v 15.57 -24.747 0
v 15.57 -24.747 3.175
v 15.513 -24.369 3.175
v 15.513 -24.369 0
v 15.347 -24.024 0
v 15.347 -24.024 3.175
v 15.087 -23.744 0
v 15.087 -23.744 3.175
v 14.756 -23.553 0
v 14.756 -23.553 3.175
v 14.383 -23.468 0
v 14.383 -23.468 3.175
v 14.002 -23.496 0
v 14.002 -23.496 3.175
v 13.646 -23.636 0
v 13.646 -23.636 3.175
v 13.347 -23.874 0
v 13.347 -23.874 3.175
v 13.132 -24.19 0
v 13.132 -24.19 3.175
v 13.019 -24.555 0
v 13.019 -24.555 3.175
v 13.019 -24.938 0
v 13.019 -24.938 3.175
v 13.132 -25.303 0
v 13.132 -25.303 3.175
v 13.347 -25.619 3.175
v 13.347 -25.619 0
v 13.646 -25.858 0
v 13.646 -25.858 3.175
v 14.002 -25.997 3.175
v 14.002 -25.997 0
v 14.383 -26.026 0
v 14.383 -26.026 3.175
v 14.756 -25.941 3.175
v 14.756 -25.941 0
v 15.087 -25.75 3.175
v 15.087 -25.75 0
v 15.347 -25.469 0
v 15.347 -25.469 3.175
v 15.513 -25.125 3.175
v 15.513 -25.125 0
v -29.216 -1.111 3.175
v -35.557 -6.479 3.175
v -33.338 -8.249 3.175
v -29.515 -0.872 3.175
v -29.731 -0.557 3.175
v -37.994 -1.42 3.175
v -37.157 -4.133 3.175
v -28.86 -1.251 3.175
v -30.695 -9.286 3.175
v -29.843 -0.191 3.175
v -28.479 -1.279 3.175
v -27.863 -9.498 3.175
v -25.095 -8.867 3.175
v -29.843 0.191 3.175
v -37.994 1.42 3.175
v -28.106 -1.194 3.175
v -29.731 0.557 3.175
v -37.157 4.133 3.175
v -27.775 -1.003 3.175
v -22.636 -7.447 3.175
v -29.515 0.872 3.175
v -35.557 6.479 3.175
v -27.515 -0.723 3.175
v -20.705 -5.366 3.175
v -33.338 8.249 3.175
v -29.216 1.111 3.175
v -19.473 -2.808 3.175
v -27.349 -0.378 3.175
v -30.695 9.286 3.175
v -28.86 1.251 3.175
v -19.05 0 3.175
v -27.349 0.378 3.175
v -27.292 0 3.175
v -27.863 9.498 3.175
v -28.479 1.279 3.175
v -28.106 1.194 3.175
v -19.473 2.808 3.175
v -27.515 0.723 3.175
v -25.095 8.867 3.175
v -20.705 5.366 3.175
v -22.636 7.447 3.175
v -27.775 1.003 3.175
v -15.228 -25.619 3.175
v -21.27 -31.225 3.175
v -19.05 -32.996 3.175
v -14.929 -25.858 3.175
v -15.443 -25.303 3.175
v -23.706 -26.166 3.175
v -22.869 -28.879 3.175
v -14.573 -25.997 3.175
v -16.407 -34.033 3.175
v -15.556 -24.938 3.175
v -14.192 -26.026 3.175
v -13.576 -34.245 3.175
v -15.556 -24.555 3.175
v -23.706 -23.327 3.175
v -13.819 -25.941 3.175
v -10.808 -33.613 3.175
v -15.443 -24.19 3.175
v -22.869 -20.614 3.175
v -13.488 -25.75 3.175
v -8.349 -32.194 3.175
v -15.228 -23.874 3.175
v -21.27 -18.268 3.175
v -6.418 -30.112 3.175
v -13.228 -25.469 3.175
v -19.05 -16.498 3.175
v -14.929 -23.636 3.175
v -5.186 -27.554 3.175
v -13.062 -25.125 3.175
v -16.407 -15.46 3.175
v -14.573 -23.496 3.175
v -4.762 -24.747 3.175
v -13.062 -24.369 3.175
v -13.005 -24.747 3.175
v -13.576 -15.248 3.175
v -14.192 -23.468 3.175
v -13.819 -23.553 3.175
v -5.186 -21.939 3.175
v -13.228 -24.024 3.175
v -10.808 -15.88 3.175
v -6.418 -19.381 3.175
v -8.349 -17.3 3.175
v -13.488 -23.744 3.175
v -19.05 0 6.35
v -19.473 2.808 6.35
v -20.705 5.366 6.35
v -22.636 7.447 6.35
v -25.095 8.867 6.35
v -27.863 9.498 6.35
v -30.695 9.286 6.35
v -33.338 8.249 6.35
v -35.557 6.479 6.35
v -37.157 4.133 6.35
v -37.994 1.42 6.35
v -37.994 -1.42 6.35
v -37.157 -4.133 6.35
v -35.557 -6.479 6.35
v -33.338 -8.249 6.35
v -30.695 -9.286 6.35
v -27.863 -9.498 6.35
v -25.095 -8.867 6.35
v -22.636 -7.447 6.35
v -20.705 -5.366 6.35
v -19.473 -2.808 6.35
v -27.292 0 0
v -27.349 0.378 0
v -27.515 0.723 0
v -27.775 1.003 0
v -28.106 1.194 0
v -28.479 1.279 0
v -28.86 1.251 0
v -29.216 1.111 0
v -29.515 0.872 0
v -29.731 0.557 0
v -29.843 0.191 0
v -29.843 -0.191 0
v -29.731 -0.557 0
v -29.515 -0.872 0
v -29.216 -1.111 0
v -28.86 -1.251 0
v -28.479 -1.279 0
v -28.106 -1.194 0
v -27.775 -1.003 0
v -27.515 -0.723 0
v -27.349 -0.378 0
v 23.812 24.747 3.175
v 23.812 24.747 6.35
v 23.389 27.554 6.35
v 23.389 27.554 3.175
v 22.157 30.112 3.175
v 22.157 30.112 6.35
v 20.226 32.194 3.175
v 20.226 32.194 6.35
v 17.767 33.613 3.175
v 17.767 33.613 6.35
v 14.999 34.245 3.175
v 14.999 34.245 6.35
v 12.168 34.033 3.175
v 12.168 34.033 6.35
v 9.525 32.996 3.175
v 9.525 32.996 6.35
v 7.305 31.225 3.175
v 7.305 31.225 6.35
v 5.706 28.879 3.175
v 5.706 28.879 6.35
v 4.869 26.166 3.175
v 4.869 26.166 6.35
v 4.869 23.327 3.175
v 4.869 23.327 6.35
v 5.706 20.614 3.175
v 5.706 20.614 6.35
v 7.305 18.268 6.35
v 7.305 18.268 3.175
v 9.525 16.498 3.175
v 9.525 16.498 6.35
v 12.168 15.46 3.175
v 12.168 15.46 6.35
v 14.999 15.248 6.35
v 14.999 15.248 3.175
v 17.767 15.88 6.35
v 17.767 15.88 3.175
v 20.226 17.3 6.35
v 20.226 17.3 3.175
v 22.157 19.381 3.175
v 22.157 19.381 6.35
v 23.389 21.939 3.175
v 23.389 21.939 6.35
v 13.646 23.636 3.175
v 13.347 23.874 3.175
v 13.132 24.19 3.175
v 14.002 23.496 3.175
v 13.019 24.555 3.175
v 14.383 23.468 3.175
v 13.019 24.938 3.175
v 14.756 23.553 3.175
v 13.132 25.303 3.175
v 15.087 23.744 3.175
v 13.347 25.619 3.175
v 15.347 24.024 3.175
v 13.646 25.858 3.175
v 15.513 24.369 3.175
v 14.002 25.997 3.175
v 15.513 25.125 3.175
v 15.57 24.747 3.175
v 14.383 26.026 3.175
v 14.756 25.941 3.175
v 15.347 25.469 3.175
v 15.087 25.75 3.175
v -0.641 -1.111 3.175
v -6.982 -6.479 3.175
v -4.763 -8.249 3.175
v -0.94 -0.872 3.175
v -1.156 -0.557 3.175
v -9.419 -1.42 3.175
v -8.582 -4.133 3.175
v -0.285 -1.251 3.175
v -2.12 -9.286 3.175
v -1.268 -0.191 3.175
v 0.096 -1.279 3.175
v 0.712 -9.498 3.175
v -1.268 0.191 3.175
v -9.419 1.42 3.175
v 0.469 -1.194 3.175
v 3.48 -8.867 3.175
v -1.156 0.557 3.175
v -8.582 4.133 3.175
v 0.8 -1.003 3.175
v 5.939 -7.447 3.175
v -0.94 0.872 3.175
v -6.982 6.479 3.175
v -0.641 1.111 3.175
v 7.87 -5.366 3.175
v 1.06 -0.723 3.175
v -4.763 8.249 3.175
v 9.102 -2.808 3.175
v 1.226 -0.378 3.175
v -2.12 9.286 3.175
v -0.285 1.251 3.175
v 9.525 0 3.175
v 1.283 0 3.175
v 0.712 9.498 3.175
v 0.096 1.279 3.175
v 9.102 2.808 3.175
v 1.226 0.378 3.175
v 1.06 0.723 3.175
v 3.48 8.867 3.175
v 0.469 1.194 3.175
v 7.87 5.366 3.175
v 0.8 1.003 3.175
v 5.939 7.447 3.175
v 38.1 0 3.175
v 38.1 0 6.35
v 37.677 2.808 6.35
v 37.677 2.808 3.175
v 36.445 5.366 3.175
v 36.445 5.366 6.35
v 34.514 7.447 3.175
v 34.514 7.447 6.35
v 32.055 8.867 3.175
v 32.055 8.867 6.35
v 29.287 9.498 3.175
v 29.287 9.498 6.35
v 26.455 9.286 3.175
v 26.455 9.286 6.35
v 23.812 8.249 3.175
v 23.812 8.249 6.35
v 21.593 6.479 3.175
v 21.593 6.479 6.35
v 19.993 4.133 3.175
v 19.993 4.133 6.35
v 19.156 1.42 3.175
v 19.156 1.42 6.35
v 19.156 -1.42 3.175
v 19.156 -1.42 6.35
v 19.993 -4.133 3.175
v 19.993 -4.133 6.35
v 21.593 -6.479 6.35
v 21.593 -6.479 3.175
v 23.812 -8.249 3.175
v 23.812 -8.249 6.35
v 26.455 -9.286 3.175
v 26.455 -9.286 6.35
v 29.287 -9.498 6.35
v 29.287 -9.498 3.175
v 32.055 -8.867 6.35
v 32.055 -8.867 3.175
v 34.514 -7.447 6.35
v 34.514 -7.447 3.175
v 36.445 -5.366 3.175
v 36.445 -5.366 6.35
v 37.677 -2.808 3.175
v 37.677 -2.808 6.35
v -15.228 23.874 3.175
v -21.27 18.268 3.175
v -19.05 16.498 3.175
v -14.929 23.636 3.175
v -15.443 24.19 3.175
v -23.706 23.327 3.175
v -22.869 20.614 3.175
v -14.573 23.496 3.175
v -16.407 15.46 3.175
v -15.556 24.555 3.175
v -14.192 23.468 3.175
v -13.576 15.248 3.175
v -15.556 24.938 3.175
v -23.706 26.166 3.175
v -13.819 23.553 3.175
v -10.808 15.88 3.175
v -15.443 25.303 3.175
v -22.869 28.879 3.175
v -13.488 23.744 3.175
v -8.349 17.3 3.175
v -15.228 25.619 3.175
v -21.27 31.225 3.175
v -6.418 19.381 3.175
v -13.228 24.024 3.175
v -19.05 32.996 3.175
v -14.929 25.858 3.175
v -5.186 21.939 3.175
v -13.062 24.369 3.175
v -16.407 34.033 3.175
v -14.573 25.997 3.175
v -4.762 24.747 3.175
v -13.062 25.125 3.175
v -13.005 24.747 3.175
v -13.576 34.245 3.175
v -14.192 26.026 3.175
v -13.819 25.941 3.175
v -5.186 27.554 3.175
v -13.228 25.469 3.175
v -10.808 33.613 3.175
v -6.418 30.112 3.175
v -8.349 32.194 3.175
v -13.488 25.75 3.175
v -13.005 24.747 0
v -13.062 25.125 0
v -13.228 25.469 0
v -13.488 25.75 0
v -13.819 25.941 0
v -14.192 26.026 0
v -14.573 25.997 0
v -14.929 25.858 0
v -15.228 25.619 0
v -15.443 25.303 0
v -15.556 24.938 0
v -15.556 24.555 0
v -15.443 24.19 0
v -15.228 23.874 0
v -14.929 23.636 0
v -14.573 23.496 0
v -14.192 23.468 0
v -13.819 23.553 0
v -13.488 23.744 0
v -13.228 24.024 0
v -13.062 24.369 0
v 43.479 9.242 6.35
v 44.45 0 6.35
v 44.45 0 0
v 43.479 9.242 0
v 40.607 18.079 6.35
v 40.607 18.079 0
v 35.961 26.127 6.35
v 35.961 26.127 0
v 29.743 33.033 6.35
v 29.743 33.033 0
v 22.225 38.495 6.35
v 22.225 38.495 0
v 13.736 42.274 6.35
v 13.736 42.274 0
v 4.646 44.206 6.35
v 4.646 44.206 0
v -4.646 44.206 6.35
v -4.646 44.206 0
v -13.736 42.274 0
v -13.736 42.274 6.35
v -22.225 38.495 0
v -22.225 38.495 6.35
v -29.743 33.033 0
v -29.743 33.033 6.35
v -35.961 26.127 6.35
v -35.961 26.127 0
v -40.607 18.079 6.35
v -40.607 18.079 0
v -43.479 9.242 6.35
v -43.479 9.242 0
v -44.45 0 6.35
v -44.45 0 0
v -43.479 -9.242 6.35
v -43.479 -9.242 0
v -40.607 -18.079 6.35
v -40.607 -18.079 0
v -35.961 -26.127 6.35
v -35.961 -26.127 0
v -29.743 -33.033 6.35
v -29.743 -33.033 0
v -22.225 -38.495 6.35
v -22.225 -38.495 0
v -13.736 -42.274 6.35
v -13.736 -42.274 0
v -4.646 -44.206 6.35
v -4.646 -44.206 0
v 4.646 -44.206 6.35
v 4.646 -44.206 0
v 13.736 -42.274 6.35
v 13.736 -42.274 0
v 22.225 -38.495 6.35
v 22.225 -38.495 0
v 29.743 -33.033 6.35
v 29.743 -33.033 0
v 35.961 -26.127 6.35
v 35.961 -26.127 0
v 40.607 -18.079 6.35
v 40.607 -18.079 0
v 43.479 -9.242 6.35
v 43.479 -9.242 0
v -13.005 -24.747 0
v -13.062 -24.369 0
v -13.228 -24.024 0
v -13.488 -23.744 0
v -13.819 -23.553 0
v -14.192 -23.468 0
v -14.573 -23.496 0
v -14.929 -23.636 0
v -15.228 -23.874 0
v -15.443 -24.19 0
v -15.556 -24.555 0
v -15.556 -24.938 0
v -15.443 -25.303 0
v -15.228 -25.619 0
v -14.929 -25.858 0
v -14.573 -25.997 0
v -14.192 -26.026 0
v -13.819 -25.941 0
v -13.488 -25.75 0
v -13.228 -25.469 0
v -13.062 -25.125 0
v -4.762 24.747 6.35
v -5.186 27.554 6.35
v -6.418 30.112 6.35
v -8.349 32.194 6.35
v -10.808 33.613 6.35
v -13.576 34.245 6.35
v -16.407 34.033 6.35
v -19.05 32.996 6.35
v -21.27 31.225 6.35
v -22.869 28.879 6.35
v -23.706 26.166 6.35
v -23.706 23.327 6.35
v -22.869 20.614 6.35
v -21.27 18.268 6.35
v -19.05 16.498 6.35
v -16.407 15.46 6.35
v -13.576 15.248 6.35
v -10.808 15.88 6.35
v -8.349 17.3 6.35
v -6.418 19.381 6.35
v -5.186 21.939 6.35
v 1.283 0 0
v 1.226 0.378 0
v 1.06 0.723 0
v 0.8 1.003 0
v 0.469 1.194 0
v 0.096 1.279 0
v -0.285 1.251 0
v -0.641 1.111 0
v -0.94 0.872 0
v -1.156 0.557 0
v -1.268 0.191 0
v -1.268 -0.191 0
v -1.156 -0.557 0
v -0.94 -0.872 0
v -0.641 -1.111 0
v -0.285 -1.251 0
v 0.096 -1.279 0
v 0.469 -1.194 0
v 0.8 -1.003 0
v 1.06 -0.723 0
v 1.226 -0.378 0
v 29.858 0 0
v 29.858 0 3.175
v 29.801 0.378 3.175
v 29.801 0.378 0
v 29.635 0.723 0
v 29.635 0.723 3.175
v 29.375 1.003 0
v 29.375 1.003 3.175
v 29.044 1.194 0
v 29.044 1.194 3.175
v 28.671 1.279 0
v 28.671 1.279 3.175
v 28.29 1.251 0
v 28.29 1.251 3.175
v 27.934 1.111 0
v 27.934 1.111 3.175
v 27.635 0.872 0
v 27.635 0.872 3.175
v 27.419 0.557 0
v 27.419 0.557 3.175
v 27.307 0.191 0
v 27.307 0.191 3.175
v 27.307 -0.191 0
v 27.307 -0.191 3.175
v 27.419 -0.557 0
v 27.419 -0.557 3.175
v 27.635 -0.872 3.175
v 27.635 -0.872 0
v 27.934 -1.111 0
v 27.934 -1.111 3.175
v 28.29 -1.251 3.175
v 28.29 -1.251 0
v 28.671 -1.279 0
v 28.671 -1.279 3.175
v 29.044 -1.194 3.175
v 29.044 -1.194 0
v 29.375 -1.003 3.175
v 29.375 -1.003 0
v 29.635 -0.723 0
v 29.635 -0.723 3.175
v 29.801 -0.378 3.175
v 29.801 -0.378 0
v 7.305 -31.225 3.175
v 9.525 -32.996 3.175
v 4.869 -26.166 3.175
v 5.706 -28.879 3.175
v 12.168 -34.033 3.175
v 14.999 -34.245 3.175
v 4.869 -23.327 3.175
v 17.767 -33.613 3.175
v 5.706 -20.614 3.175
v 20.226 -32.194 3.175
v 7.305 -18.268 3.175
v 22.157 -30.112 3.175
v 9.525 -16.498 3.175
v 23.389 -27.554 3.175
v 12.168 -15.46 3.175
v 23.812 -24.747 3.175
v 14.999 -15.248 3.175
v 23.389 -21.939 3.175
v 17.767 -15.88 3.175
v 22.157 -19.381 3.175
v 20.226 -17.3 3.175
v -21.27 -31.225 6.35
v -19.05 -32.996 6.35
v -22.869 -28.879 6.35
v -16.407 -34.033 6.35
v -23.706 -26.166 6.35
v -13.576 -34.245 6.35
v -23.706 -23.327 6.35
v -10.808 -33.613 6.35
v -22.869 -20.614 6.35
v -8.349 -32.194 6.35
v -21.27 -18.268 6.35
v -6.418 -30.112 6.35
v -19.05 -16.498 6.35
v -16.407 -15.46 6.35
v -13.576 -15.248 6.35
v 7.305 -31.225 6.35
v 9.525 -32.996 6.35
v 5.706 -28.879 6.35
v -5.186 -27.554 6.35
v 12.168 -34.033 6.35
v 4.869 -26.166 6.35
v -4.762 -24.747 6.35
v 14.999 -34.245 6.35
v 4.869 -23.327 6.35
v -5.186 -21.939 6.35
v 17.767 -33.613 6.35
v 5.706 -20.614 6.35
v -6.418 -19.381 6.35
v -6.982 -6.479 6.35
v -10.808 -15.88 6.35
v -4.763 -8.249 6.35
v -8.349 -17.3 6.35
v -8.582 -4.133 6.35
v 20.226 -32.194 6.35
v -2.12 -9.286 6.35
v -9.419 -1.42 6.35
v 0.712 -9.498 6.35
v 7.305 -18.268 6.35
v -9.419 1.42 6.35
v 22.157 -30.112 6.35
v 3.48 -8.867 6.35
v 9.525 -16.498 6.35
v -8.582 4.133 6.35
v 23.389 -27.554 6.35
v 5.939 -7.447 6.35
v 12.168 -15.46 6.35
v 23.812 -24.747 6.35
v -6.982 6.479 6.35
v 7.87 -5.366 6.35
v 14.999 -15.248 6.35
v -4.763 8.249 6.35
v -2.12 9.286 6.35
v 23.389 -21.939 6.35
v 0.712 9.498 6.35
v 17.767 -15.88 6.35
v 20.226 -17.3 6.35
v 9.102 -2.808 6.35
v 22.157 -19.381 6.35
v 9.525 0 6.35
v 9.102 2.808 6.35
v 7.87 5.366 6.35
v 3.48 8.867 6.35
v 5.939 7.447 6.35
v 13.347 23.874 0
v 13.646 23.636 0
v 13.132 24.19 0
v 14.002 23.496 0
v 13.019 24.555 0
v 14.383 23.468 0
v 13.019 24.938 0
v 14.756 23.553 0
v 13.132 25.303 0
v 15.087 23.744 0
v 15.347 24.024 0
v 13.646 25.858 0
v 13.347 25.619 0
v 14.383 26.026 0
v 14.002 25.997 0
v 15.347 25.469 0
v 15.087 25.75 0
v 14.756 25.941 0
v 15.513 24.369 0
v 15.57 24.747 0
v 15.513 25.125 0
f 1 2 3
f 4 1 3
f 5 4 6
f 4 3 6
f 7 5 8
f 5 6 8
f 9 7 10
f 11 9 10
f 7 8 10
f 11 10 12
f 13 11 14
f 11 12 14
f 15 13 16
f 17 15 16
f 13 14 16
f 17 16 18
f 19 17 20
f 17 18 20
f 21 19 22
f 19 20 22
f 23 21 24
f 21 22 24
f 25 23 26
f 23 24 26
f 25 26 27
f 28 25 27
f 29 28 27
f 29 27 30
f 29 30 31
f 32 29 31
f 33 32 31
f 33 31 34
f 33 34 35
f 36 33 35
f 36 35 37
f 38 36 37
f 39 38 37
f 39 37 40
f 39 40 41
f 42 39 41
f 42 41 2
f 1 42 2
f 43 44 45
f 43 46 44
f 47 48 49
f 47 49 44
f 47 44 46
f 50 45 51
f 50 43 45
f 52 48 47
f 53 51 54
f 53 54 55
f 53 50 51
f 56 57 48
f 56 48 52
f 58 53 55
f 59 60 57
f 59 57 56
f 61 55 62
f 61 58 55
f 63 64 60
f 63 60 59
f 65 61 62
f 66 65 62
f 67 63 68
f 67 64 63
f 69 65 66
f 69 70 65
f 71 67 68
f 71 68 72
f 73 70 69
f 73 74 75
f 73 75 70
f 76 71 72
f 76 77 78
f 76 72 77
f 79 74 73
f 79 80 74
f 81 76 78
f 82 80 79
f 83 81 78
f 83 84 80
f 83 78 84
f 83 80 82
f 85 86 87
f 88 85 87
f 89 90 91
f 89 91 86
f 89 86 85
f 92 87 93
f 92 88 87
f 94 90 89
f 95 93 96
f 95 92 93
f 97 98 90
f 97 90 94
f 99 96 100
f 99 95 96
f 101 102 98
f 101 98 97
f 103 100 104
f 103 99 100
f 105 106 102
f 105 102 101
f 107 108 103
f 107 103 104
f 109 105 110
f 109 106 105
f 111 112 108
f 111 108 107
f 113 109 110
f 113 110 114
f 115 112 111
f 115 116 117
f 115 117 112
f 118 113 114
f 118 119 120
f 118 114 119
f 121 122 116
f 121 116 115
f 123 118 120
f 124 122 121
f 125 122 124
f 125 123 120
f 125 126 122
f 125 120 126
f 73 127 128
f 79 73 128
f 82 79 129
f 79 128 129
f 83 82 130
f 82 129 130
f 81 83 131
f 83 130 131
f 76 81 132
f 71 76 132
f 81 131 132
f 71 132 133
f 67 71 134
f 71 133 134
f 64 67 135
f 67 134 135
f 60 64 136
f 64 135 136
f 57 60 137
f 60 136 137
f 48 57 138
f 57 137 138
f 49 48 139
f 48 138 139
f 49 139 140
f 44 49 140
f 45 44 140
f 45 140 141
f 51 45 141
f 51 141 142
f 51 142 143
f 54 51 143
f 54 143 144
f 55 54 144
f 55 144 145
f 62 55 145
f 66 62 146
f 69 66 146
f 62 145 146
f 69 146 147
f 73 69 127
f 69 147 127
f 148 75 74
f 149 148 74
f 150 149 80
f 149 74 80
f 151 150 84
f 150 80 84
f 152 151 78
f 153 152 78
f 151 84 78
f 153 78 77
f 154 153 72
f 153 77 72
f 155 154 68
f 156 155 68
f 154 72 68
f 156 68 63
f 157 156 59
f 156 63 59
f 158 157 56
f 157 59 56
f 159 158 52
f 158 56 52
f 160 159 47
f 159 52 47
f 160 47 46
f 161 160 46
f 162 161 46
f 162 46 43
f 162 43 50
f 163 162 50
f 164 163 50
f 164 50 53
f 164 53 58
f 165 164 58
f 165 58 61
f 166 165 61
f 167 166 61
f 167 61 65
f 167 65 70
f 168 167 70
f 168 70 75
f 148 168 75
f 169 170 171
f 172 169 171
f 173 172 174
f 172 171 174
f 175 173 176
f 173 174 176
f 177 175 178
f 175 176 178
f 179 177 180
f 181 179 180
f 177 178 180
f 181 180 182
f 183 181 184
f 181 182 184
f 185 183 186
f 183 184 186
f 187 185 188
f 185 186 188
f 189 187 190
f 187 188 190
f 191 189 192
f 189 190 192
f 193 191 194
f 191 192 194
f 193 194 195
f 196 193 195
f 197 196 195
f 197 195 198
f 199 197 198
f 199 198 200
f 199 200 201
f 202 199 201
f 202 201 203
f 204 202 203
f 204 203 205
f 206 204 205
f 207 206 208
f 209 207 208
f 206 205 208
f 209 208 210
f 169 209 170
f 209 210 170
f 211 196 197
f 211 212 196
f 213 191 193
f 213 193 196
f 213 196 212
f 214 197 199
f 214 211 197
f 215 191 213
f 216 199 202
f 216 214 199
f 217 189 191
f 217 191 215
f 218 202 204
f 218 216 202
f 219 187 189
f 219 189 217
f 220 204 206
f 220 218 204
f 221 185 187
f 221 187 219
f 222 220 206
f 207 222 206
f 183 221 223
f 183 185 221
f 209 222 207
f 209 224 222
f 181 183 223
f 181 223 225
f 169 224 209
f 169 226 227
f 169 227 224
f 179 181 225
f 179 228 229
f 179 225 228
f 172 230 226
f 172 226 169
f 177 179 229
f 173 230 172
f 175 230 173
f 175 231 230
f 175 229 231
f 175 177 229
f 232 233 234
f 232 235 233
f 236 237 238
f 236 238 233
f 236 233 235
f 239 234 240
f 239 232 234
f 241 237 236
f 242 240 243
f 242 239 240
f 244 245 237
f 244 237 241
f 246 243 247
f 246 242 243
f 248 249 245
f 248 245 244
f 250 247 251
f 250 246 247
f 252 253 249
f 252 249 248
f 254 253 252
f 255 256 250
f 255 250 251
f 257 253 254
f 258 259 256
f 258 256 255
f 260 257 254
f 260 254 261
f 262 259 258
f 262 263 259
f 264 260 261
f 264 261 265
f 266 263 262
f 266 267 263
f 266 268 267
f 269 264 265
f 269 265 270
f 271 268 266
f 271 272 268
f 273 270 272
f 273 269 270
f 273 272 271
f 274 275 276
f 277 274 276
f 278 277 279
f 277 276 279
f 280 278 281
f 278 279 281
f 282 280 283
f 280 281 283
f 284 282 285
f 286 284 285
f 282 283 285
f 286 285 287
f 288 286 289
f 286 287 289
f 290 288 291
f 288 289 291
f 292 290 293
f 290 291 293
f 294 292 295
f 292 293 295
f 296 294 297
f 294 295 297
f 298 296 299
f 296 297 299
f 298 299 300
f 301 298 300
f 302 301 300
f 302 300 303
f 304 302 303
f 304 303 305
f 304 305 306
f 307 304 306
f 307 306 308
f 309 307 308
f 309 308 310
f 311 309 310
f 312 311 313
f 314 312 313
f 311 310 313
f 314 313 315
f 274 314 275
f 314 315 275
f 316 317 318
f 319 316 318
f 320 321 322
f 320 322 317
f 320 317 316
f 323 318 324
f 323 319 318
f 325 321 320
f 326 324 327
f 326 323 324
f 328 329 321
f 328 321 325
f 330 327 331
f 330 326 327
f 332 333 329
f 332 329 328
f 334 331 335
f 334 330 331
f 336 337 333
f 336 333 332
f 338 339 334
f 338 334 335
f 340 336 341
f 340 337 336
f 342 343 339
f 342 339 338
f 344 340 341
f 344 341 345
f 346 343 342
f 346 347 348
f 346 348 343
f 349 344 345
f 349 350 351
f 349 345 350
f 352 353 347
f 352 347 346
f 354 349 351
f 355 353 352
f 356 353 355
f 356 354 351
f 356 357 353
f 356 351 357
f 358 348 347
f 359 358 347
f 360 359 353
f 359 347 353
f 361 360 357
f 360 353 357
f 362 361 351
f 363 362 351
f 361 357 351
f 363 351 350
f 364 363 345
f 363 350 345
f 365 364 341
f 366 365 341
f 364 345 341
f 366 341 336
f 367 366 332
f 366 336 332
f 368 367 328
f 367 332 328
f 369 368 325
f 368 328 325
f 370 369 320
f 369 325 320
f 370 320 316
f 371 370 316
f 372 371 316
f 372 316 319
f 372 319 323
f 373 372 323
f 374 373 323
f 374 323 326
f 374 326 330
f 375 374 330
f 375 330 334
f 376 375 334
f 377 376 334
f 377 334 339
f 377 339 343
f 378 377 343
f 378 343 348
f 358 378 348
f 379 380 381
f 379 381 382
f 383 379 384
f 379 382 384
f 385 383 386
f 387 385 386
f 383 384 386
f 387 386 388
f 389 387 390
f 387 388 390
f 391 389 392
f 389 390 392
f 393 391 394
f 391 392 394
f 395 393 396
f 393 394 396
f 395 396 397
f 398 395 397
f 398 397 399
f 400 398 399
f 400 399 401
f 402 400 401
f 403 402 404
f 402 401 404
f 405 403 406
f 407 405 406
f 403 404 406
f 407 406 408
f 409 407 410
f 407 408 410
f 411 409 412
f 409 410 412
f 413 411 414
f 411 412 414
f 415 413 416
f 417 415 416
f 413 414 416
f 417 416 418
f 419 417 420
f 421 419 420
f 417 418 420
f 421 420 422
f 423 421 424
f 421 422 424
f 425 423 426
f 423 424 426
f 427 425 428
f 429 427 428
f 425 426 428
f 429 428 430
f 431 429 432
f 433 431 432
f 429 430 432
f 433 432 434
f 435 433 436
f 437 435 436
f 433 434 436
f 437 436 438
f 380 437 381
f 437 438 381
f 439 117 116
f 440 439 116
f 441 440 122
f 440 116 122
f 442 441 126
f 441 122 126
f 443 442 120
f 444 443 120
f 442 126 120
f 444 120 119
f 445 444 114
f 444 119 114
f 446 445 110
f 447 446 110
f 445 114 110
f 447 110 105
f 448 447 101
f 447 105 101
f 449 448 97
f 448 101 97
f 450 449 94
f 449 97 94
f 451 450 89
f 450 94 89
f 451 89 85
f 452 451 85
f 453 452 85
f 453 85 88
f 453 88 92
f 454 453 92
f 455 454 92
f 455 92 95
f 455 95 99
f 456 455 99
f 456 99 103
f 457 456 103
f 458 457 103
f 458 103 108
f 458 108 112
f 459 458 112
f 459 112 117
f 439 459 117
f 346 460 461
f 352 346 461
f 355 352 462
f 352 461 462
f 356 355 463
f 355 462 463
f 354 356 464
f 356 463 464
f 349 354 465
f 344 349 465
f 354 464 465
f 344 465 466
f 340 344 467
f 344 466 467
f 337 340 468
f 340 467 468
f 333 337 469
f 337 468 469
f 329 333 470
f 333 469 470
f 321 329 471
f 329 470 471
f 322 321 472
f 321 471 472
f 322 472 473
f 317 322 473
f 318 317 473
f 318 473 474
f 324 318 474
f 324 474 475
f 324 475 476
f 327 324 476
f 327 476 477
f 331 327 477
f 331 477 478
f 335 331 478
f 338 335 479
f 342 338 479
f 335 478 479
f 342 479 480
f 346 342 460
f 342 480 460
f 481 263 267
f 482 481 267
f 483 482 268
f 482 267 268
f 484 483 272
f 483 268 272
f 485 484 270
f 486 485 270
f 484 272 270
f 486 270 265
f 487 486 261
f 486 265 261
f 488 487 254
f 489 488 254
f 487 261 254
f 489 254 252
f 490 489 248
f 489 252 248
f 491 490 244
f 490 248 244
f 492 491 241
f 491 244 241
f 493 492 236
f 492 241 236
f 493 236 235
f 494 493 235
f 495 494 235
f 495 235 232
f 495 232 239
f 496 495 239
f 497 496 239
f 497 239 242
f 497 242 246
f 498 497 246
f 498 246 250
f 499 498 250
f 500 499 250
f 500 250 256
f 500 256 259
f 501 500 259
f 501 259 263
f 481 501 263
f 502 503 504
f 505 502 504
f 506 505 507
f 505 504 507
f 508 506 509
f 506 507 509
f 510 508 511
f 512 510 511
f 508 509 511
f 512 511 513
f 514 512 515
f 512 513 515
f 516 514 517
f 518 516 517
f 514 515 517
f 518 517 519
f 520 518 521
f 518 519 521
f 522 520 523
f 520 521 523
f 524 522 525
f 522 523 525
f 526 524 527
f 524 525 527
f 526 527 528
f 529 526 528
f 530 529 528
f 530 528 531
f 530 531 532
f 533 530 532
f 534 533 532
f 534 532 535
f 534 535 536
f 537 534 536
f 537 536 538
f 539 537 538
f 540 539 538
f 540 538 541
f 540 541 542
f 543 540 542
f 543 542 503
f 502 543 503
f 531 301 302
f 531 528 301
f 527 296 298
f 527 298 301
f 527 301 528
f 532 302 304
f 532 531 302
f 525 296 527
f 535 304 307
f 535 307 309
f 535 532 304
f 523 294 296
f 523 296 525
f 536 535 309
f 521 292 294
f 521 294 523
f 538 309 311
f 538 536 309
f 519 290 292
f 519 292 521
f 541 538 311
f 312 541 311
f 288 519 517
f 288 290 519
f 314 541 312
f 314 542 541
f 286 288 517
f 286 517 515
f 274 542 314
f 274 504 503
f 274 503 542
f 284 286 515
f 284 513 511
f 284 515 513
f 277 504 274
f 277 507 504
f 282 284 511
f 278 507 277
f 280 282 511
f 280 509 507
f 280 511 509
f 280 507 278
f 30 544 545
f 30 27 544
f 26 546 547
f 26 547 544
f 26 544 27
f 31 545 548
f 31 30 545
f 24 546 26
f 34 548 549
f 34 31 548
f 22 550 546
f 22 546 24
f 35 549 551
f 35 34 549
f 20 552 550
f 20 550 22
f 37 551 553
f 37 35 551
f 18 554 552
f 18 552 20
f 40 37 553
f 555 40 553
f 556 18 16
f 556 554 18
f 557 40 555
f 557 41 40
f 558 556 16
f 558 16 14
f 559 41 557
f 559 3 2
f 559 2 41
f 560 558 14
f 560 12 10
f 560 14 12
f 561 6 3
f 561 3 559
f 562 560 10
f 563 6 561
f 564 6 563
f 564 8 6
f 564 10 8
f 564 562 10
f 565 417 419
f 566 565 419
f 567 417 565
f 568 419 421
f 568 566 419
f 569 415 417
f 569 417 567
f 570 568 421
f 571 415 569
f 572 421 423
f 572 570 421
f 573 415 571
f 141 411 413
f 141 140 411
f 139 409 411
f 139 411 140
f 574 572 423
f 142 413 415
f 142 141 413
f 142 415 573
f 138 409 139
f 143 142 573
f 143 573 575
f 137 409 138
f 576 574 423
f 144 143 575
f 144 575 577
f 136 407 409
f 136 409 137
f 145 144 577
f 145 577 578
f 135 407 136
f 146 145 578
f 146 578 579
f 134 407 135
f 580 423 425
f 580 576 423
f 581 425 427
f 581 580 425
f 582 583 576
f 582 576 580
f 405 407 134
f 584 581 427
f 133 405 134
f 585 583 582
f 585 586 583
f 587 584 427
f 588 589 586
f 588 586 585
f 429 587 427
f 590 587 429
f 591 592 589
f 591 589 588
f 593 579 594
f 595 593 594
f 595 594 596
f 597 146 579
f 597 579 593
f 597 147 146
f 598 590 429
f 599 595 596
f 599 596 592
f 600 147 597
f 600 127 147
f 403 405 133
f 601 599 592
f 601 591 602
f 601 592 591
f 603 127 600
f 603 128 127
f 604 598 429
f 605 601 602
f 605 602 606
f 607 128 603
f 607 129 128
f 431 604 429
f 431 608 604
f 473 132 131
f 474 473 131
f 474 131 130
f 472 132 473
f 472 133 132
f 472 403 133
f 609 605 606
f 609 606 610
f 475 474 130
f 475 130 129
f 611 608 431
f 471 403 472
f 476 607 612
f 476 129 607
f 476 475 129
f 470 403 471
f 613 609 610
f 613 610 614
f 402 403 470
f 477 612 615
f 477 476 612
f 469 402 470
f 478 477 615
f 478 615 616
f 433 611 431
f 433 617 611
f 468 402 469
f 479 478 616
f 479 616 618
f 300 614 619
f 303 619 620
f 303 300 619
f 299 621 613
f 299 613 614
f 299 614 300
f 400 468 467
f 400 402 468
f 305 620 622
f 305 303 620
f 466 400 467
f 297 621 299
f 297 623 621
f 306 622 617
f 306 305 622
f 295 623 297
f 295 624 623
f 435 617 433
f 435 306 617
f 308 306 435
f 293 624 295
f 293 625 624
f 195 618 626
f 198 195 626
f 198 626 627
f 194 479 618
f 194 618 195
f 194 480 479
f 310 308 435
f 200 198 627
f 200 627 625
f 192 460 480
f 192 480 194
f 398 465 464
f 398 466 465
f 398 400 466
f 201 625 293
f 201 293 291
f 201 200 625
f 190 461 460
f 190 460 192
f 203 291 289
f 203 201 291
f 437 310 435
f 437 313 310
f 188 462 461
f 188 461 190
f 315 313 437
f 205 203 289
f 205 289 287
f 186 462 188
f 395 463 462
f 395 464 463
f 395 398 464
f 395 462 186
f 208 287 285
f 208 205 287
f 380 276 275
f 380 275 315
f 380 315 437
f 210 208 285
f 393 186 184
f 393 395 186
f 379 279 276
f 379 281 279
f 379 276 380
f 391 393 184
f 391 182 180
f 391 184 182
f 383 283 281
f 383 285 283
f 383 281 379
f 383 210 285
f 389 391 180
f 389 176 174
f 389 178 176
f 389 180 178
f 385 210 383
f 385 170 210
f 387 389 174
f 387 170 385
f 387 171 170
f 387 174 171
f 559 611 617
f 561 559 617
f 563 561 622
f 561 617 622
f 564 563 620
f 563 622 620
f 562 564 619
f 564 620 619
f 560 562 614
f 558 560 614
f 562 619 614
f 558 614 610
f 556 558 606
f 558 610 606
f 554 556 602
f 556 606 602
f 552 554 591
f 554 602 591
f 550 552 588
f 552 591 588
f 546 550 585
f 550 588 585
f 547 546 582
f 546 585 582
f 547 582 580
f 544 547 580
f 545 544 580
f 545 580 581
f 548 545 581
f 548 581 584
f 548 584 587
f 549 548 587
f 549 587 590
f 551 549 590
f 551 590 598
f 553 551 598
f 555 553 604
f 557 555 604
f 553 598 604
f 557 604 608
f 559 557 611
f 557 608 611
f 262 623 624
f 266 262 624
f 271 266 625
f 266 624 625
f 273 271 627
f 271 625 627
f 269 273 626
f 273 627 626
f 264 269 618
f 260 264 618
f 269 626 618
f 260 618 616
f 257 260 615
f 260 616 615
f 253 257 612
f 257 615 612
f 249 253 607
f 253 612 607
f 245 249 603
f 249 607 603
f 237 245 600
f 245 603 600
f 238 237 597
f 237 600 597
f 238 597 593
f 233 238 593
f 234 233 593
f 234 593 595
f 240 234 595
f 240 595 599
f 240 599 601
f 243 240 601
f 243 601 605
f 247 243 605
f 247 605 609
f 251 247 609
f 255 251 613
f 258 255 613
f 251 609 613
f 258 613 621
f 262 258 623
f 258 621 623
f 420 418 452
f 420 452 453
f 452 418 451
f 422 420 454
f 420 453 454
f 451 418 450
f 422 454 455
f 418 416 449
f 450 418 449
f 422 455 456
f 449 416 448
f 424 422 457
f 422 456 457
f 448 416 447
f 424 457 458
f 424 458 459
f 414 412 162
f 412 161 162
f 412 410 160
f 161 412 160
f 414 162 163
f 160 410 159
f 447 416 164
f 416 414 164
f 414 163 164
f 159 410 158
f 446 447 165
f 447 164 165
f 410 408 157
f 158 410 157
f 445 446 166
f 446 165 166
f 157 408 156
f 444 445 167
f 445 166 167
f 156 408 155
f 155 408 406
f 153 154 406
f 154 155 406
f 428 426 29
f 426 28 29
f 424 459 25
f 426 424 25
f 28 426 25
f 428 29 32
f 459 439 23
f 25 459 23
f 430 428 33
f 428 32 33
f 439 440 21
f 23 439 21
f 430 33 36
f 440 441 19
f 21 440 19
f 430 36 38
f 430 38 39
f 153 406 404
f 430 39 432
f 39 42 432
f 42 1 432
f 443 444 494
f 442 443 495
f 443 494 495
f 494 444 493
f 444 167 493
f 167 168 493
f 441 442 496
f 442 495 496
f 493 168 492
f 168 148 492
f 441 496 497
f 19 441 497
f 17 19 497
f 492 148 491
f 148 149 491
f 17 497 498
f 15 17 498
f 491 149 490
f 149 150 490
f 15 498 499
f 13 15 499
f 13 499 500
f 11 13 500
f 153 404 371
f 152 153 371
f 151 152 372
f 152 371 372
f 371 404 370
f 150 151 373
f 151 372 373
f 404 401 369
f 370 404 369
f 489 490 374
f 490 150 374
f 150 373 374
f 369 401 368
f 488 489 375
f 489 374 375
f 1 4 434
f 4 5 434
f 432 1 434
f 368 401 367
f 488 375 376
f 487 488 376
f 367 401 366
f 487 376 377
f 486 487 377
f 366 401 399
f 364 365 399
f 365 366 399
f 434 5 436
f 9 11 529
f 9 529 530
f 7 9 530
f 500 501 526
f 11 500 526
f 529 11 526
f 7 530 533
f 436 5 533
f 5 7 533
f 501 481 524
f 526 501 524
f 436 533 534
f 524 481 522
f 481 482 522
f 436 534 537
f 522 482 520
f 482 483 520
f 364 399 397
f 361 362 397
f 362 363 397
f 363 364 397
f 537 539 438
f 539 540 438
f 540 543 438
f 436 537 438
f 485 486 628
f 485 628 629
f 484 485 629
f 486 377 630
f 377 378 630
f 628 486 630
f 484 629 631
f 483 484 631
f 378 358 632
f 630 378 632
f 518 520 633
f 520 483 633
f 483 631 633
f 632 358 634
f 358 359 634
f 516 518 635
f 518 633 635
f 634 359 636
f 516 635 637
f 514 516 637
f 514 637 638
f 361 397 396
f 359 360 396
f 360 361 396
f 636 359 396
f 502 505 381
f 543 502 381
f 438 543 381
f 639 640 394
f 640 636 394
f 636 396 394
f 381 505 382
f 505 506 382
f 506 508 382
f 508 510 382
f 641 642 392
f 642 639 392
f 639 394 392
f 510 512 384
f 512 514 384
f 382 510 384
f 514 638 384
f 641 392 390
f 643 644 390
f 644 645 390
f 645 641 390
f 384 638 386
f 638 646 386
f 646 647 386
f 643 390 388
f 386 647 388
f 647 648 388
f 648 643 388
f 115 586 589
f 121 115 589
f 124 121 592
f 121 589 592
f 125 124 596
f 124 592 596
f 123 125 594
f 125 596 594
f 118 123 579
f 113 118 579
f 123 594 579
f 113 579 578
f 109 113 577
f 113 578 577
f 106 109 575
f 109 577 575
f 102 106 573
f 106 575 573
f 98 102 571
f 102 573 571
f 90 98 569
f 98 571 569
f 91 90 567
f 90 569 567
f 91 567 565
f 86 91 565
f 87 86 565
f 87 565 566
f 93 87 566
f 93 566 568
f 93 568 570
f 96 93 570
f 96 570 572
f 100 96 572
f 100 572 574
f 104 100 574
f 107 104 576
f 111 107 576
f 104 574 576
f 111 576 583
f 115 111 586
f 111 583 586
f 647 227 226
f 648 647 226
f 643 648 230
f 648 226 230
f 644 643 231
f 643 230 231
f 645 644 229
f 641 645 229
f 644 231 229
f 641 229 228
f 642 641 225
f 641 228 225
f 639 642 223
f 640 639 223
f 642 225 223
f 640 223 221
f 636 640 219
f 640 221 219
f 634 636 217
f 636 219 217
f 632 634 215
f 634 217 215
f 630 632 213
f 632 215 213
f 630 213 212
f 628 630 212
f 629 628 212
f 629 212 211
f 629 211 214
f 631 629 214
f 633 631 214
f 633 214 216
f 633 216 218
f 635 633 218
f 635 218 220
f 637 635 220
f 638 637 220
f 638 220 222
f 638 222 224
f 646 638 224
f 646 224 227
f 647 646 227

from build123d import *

# Parameters (mm, degrees)
F0_R     = 44.45
F1_DEPTH = 6.35
F2_R     = 9.525
F3_DEPTH = 3.175
F4_R     = 1.2827
F5_DEPTH = 25.4


with BuildPart() as f1:
    # F0 (on Top) → F1 (new body)
    with BuildSketch(Plane.XY):
        Circle(F0_R)
    extrude(amount=F1_DEPTH)

    # F2 (on face) → F3 (cut)
    with BuildSketch(Plane.XY.offset(6.35)):
        with Locations((-28.575, 0)):
            Circle(F2_R)
        with Locations((-14.2875, 24.746676)):
            Circle(F2_R)
        with Locations((14.2875, 24.746676)):
            Circle(F2_R)
        with Locations((28.575, 0)):
            Circle(F2_R)
        Circle(F2_R)
        with Locations((14.2875, -24.746676)):
            Circle(F2_R)
        with Locations((-14.2875, -24.746676)):
            Circle(F2_R)
    extrude(amount=-F3_DEPTH, mode=Mode.SUBTRACT)

    # F4 (on face) → F5 (cut)
    with BuildSketch(Plane.XY.offset(6.35)):
        with Locations((28.575, 0)):
            Circle(F4_R)
        Circle(F4_R)
        with Locations((-14.2875, 24.746676)):
            Circle(F4_R)
        with Locations((14.2875, 24.746676)):
            Circle(F4_R)
        with Locations((-28.575, 0)):
            Circle(F4_R)
        with Locations((-14.2875, -24.746676)):
            Circle(F4_R)
        with Locations((14.2875, -24.746676)):
            Circle(F4_R)
    extrude(amount=-F5_DEPTH, mode=Mode.SUBTRACT)


solid = f1.part
